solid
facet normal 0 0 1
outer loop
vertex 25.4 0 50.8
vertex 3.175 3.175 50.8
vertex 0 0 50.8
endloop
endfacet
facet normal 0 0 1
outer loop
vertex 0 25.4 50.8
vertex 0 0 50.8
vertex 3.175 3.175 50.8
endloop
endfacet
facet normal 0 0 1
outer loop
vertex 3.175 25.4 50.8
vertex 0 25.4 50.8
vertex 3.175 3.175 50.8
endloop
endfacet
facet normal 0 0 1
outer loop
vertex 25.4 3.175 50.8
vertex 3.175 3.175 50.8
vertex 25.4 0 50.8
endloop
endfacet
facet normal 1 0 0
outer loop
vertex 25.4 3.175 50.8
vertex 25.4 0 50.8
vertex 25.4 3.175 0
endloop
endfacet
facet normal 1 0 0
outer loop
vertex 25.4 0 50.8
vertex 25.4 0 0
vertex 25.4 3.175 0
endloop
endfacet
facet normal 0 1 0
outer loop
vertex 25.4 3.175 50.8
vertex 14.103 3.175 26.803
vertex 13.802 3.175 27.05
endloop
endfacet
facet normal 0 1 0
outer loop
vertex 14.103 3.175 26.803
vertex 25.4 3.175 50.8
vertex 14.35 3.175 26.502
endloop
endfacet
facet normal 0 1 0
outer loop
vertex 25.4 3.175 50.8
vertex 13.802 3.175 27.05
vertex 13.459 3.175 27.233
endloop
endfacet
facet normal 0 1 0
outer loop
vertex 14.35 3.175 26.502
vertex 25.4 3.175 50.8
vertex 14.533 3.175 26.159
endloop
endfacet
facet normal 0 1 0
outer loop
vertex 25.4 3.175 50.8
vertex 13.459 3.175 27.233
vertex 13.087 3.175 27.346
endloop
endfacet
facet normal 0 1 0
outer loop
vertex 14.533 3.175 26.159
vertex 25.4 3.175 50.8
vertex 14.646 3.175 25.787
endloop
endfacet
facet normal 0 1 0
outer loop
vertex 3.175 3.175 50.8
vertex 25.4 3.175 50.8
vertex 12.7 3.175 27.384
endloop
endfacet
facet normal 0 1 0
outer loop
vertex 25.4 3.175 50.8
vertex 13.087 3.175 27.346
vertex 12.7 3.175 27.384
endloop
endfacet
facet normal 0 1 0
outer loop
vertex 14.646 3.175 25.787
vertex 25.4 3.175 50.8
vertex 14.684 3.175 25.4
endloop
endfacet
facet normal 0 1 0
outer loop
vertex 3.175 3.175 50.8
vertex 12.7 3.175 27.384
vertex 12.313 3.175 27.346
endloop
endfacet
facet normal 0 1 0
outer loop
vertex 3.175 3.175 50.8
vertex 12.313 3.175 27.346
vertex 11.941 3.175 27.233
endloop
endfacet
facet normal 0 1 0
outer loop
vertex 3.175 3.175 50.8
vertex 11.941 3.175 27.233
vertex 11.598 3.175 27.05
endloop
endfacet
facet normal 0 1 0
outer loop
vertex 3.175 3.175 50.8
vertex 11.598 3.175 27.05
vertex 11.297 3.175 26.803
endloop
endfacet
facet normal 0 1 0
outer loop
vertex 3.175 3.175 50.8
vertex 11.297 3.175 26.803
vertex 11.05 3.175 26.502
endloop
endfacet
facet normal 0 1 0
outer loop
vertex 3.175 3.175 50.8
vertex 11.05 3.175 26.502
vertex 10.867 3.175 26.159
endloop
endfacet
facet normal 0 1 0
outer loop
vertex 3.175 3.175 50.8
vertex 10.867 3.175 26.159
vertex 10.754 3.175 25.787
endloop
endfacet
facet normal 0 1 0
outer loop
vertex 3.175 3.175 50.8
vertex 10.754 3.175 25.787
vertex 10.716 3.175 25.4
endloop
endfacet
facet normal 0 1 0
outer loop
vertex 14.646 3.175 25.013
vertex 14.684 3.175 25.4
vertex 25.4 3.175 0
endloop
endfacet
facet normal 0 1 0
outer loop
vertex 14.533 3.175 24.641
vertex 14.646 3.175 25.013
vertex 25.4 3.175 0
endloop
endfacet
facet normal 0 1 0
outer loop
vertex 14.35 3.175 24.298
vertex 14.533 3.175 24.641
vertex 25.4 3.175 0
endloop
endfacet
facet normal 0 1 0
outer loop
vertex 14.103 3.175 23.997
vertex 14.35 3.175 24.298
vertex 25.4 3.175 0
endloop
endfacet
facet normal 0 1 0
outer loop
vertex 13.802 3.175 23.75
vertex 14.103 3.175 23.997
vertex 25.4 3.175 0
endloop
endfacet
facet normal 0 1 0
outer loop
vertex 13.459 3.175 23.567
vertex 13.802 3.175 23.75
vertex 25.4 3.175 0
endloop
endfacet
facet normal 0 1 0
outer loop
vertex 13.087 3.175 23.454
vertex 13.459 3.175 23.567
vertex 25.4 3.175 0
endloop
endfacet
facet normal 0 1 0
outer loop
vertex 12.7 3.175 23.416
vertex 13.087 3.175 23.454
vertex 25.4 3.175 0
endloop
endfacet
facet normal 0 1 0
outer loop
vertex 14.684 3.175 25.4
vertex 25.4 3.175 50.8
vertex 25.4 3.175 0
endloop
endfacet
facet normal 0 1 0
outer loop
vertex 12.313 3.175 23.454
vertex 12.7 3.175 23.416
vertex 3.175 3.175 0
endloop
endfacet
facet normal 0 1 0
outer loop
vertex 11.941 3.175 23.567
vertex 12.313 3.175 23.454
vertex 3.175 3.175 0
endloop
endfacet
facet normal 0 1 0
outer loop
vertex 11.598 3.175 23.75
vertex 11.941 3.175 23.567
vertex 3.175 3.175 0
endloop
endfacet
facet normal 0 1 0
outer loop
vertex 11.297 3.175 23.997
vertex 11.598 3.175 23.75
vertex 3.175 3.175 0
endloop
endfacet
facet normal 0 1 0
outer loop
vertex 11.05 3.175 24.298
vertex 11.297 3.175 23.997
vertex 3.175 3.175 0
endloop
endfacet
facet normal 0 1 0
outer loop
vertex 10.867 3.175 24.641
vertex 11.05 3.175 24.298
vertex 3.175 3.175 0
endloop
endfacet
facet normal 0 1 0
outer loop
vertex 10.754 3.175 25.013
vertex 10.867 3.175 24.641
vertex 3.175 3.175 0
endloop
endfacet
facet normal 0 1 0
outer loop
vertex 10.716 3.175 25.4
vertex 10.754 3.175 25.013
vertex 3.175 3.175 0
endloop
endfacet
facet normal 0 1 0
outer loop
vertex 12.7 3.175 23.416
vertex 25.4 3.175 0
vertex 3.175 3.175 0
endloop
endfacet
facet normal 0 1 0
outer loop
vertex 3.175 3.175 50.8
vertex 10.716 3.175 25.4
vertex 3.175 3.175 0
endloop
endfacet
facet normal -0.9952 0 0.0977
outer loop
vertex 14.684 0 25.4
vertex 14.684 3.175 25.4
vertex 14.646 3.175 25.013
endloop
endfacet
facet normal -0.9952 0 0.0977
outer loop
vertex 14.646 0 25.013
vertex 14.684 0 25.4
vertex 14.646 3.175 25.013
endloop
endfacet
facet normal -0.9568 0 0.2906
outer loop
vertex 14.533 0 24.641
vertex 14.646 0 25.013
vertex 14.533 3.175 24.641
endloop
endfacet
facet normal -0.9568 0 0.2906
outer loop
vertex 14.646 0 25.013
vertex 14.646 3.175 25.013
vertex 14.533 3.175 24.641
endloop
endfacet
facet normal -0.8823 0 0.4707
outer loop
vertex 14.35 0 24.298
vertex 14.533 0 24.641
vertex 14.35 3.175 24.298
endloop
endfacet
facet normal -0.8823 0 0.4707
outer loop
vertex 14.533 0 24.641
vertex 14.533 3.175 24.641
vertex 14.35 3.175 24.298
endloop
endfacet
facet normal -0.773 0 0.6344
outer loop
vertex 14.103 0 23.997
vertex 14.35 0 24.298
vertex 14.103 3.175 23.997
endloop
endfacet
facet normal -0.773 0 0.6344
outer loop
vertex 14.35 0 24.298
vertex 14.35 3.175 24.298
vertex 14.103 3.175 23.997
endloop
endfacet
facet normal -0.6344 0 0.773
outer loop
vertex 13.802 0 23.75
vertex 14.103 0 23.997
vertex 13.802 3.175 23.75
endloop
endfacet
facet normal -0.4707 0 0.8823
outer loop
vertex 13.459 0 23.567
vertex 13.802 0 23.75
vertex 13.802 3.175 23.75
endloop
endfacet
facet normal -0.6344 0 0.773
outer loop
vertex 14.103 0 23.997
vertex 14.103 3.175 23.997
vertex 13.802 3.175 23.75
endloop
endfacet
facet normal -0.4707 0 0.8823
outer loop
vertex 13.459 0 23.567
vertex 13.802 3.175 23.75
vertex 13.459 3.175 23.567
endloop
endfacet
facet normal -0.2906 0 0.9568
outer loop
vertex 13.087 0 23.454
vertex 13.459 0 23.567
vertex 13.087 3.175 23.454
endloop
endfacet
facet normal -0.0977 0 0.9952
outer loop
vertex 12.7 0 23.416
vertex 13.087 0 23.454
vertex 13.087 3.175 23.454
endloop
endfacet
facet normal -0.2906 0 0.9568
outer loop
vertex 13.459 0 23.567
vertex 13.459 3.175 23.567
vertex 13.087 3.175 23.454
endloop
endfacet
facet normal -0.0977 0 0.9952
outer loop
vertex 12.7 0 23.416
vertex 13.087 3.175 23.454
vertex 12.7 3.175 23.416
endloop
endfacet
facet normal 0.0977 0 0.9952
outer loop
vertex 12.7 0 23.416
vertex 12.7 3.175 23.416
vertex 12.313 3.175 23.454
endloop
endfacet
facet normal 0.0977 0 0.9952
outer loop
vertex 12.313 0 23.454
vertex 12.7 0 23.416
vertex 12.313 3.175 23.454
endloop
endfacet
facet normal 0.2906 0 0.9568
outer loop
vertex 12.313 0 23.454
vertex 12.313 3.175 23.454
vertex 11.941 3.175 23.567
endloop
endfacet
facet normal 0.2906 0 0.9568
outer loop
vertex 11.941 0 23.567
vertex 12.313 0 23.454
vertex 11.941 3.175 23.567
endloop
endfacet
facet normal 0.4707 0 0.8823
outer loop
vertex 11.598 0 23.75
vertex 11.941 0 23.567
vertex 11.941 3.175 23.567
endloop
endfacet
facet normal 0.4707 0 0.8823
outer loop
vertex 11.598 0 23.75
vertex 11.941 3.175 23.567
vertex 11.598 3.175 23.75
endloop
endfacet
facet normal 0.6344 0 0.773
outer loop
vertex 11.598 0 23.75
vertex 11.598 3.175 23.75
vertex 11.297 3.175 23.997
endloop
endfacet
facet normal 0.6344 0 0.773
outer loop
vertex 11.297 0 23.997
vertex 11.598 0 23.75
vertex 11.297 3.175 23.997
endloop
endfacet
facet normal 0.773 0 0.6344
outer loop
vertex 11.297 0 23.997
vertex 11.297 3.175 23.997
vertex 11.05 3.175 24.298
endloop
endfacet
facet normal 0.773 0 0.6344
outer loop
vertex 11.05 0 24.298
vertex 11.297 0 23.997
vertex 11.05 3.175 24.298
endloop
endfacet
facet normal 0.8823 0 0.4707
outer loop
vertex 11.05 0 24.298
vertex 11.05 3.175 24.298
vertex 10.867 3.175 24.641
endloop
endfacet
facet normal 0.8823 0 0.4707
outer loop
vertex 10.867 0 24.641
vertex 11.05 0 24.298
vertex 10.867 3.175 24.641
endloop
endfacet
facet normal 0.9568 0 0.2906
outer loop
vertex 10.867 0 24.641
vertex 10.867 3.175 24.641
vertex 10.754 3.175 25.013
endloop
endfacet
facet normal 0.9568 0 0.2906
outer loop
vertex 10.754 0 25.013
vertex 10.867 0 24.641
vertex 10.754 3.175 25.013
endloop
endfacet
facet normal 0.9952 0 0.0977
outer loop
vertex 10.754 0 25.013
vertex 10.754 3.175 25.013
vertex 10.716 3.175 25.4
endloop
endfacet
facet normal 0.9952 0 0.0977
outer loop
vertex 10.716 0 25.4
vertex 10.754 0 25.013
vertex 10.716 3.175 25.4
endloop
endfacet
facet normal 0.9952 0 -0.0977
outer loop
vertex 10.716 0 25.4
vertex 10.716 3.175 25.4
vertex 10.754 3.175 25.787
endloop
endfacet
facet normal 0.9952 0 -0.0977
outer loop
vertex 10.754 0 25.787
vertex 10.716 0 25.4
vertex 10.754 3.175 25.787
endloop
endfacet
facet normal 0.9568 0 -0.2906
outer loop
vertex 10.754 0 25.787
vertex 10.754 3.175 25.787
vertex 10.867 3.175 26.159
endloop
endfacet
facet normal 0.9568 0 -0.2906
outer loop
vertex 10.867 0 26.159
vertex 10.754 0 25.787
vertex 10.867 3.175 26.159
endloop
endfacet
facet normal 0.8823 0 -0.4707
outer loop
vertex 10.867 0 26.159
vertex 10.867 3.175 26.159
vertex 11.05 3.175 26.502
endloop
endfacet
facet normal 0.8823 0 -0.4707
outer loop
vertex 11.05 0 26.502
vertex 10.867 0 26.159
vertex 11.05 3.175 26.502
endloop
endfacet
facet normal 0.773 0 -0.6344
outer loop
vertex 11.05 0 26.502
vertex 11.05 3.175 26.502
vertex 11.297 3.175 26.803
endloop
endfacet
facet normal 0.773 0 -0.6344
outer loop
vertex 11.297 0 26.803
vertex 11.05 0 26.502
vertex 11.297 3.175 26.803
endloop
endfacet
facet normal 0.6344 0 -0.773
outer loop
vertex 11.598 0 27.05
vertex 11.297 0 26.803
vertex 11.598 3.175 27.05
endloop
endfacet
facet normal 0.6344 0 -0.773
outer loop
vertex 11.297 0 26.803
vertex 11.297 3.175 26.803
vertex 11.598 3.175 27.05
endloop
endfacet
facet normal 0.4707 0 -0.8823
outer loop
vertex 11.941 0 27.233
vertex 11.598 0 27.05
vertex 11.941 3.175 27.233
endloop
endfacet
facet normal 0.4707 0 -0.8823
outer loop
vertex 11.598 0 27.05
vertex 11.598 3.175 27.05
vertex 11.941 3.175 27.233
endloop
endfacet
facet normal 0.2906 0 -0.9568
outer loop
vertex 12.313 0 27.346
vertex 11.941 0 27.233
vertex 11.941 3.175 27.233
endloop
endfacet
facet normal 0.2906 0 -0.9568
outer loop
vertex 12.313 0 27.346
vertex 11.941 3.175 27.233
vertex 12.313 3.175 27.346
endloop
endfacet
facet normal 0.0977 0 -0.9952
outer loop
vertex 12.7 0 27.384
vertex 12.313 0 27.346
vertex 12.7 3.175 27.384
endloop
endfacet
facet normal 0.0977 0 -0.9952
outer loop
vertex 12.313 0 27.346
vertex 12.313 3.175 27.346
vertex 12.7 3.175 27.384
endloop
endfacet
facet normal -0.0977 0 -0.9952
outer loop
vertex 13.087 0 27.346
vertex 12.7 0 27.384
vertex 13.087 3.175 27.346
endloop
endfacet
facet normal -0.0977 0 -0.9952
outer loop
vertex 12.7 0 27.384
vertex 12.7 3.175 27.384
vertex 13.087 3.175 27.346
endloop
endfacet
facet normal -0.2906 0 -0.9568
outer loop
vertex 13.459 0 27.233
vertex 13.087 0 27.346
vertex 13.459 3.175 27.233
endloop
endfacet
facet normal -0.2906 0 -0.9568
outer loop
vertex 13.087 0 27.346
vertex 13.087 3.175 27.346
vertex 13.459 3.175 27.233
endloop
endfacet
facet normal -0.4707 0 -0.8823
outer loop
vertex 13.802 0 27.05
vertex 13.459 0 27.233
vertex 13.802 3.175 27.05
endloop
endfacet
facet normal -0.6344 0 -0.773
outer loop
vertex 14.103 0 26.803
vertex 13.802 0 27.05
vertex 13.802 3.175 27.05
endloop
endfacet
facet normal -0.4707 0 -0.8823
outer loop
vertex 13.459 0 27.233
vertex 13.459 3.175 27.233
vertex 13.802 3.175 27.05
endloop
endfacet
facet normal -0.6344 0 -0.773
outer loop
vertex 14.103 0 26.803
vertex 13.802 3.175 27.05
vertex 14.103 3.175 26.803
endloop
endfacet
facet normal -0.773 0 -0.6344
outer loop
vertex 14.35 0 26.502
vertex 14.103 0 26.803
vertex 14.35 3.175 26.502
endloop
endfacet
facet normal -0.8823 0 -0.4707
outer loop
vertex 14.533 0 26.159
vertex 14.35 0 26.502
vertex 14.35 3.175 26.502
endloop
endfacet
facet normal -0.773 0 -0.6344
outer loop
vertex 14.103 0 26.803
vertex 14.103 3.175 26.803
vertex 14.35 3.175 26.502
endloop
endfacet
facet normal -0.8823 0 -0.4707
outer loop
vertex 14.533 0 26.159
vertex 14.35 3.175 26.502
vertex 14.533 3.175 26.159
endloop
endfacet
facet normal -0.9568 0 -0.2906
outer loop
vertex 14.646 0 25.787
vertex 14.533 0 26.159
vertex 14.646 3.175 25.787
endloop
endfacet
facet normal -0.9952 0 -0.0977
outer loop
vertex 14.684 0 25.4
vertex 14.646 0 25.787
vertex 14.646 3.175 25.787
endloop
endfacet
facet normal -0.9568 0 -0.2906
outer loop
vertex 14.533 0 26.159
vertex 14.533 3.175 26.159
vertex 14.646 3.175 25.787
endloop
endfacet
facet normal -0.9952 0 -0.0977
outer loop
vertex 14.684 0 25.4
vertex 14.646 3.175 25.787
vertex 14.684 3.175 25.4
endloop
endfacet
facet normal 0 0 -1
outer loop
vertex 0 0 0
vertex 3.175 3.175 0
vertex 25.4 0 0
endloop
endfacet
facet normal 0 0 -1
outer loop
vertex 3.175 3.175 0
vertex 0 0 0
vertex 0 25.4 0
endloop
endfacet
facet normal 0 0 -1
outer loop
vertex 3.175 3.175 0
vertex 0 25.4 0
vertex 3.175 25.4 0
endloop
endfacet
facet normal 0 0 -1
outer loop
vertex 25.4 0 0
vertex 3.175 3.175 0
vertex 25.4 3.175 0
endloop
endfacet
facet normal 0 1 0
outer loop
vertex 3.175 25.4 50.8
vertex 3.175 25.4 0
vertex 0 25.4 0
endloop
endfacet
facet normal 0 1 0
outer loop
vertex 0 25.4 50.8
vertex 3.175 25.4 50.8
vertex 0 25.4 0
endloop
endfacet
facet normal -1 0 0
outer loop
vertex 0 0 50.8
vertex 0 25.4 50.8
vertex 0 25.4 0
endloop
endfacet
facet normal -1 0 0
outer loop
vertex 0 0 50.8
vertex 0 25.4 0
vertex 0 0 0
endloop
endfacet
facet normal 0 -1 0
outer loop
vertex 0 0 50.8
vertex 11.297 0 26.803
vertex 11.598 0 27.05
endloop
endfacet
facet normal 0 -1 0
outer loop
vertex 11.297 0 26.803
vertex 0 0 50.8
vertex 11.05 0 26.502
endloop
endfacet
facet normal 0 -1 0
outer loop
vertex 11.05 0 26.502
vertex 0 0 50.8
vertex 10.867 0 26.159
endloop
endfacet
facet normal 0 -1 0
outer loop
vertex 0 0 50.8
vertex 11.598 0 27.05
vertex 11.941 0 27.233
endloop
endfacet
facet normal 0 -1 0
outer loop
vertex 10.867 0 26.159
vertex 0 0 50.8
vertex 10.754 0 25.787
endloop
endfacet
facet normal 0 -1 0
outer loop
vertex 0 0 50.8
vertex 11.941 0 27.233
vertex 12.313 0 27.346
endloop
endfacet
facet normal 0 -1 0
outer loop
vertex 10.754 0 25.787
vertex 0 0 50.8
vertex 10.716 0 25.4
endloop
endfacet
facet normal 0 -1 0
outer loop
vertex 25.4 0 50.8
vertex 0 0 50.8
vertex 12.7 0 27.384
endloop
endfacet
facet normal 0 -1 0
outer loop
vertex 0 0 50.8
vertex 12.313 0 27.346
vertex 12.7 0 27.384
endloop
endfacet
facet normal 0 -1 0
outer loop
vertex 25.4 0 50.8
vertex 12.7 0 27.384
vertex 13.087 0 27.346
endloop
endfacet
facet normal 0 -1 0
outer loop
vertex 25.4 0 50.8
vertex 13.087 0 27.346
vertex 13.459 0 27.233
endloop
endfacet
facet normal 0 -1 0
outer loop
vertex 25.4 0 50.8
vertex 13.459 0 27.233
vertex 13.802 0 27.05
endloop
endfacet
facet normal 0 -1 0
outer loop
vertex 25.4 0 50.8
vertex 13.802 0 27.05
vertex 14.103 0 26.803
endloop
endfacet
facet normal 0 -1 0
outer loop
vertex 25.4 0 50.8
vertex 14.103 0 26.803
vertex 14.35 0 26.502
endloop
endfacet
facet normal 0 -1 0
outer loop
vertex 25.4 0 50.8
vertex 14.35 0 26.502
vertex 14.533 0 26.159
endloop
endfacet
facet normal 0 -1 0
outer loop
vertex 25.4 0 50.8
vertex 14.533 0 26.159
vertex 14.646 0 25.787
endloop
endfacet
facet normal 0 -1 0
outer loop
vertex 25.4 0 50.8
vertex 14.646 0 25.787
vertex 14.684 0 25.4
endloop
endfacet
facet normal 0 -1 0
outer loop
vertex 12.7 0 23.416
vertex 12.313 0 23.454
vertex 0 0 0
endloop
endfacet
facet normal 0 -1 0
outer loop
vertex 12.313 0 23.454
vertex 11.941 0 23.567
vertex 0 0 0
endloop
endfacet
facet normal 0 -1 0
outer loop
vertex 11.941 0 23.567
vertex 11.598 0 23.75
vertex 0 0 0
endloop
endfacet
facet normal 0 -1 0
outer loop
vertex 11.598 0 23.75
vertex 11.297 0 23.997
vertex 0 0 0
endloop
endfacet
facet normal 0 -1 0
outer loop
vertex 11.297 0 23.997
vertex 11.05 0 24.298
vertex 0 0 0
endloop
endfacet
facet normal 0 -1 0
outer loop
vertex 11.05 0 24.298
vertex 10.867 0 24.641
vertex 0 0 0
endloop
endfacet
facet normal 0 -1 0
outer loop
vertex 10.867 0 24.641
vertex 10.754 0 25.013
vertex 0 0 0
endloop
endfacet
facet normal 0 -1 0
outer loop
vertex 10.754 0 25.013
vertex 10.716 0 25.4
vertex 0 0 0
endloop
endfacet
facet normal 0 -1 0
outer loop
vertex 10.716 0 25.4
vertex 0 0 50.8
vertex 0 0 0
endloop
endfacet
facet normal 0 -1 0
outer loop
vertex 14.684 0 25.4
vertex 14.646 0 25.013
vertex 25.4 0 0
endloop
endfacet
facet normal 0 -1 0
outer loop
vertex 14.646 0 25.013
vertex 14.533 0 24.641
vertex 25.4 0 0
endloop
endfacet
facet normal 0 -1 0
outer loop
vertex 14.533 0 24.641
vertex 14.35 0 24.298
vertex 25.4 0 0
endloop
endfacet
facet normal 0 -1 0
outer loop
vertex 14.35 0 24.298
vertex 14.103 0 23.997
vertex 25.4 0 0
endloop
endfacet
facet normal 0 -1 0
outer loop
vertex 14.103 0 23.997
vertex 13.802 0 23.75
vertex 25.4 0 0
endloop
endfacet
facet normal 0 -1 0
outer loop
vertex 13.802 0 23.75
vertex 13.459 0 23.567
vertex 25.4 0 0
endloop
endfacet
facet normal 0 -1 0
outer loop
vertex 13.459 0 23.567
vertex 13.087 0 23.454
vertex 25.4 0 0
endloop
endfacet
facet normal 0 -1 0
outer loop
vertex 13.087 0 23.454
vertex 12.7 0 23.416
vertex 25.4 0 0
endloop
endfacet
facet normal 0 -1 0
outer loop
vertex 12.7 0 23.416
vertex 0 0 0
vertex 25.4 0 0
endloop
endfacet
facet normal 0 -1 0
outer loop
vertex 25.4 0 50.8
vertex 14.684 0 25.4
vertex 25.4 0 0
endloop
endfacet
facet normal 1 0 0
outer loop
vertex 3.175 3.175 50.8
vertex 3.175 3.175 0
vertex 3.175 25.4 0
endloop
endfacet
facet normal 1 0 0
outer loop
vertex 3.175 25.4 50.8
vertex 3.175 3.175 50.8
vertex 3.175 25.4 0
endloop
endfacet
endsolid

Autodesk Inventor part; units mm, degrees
ref_plane "YZ Plane" through (0, 0, 0) normal (1, 0, 0) x (0, 1, 0)
ref_plane "XZ Plane" through (0, 0, 0) normal (0, 1, 0) x (-1, 0, 0)
ref_plane "XY Plane" through (0, 0, 0) normal (0, 0, 1) x (1, 0, 0)
sketch "Sketch1" plane through (0, 0, 0) normal (0, 0, 1) x (1, 0, 0)
  line L0 (0, 0) -> (3.175, 0)
  line L1 (3.175, 0) -> (3.175, 25.4)
  line L2 (3.175, 25.4) -> (0, 25.4)
  line L3 (0, 25.4) -> (0, 0)
  line L4 (0, 0) -> (25.4, 0)
  line L5 (25.4, 0) -> (25.4, 3.175)
  line L6 (25.4, 3.175) -> (0, 3.175)
  line L7 (0, 3.175) -> (0, 0)
  dimension "d0" = 3.175
  dimension "d1" = 25.4
  dimension "d2" = 25.4
  dimension "d3" = 3.175
extrude "Extrusion1" add sketch "Sketch1" along normal blind 50.8
sketch "Sketch2" plane through (3.175, 3.175, 0) normal (0, 1, 0) x (1, 0, 0)
  line L0 (-3.175, 0) -> (-3.175, -50.8) construction
  line L1 (-3.175, 0) -> (9.525, 0) construction
  line L2 (22.225, 0) -> (0, 0) construction
  line L3 (9.525, 0) -> (9.525, -25.4) construction
  circle A0 centre (9.525, -25.4) radius 1.9844
  dimension "d6" = 12.7
  dimension "d7" = 25.4
  dimension "d8" = 3.9688
extrude "Extrusion2" cut sketch "Sketch2" against normal blind 50.8
properties part number "1x1 L brackets 2in"
